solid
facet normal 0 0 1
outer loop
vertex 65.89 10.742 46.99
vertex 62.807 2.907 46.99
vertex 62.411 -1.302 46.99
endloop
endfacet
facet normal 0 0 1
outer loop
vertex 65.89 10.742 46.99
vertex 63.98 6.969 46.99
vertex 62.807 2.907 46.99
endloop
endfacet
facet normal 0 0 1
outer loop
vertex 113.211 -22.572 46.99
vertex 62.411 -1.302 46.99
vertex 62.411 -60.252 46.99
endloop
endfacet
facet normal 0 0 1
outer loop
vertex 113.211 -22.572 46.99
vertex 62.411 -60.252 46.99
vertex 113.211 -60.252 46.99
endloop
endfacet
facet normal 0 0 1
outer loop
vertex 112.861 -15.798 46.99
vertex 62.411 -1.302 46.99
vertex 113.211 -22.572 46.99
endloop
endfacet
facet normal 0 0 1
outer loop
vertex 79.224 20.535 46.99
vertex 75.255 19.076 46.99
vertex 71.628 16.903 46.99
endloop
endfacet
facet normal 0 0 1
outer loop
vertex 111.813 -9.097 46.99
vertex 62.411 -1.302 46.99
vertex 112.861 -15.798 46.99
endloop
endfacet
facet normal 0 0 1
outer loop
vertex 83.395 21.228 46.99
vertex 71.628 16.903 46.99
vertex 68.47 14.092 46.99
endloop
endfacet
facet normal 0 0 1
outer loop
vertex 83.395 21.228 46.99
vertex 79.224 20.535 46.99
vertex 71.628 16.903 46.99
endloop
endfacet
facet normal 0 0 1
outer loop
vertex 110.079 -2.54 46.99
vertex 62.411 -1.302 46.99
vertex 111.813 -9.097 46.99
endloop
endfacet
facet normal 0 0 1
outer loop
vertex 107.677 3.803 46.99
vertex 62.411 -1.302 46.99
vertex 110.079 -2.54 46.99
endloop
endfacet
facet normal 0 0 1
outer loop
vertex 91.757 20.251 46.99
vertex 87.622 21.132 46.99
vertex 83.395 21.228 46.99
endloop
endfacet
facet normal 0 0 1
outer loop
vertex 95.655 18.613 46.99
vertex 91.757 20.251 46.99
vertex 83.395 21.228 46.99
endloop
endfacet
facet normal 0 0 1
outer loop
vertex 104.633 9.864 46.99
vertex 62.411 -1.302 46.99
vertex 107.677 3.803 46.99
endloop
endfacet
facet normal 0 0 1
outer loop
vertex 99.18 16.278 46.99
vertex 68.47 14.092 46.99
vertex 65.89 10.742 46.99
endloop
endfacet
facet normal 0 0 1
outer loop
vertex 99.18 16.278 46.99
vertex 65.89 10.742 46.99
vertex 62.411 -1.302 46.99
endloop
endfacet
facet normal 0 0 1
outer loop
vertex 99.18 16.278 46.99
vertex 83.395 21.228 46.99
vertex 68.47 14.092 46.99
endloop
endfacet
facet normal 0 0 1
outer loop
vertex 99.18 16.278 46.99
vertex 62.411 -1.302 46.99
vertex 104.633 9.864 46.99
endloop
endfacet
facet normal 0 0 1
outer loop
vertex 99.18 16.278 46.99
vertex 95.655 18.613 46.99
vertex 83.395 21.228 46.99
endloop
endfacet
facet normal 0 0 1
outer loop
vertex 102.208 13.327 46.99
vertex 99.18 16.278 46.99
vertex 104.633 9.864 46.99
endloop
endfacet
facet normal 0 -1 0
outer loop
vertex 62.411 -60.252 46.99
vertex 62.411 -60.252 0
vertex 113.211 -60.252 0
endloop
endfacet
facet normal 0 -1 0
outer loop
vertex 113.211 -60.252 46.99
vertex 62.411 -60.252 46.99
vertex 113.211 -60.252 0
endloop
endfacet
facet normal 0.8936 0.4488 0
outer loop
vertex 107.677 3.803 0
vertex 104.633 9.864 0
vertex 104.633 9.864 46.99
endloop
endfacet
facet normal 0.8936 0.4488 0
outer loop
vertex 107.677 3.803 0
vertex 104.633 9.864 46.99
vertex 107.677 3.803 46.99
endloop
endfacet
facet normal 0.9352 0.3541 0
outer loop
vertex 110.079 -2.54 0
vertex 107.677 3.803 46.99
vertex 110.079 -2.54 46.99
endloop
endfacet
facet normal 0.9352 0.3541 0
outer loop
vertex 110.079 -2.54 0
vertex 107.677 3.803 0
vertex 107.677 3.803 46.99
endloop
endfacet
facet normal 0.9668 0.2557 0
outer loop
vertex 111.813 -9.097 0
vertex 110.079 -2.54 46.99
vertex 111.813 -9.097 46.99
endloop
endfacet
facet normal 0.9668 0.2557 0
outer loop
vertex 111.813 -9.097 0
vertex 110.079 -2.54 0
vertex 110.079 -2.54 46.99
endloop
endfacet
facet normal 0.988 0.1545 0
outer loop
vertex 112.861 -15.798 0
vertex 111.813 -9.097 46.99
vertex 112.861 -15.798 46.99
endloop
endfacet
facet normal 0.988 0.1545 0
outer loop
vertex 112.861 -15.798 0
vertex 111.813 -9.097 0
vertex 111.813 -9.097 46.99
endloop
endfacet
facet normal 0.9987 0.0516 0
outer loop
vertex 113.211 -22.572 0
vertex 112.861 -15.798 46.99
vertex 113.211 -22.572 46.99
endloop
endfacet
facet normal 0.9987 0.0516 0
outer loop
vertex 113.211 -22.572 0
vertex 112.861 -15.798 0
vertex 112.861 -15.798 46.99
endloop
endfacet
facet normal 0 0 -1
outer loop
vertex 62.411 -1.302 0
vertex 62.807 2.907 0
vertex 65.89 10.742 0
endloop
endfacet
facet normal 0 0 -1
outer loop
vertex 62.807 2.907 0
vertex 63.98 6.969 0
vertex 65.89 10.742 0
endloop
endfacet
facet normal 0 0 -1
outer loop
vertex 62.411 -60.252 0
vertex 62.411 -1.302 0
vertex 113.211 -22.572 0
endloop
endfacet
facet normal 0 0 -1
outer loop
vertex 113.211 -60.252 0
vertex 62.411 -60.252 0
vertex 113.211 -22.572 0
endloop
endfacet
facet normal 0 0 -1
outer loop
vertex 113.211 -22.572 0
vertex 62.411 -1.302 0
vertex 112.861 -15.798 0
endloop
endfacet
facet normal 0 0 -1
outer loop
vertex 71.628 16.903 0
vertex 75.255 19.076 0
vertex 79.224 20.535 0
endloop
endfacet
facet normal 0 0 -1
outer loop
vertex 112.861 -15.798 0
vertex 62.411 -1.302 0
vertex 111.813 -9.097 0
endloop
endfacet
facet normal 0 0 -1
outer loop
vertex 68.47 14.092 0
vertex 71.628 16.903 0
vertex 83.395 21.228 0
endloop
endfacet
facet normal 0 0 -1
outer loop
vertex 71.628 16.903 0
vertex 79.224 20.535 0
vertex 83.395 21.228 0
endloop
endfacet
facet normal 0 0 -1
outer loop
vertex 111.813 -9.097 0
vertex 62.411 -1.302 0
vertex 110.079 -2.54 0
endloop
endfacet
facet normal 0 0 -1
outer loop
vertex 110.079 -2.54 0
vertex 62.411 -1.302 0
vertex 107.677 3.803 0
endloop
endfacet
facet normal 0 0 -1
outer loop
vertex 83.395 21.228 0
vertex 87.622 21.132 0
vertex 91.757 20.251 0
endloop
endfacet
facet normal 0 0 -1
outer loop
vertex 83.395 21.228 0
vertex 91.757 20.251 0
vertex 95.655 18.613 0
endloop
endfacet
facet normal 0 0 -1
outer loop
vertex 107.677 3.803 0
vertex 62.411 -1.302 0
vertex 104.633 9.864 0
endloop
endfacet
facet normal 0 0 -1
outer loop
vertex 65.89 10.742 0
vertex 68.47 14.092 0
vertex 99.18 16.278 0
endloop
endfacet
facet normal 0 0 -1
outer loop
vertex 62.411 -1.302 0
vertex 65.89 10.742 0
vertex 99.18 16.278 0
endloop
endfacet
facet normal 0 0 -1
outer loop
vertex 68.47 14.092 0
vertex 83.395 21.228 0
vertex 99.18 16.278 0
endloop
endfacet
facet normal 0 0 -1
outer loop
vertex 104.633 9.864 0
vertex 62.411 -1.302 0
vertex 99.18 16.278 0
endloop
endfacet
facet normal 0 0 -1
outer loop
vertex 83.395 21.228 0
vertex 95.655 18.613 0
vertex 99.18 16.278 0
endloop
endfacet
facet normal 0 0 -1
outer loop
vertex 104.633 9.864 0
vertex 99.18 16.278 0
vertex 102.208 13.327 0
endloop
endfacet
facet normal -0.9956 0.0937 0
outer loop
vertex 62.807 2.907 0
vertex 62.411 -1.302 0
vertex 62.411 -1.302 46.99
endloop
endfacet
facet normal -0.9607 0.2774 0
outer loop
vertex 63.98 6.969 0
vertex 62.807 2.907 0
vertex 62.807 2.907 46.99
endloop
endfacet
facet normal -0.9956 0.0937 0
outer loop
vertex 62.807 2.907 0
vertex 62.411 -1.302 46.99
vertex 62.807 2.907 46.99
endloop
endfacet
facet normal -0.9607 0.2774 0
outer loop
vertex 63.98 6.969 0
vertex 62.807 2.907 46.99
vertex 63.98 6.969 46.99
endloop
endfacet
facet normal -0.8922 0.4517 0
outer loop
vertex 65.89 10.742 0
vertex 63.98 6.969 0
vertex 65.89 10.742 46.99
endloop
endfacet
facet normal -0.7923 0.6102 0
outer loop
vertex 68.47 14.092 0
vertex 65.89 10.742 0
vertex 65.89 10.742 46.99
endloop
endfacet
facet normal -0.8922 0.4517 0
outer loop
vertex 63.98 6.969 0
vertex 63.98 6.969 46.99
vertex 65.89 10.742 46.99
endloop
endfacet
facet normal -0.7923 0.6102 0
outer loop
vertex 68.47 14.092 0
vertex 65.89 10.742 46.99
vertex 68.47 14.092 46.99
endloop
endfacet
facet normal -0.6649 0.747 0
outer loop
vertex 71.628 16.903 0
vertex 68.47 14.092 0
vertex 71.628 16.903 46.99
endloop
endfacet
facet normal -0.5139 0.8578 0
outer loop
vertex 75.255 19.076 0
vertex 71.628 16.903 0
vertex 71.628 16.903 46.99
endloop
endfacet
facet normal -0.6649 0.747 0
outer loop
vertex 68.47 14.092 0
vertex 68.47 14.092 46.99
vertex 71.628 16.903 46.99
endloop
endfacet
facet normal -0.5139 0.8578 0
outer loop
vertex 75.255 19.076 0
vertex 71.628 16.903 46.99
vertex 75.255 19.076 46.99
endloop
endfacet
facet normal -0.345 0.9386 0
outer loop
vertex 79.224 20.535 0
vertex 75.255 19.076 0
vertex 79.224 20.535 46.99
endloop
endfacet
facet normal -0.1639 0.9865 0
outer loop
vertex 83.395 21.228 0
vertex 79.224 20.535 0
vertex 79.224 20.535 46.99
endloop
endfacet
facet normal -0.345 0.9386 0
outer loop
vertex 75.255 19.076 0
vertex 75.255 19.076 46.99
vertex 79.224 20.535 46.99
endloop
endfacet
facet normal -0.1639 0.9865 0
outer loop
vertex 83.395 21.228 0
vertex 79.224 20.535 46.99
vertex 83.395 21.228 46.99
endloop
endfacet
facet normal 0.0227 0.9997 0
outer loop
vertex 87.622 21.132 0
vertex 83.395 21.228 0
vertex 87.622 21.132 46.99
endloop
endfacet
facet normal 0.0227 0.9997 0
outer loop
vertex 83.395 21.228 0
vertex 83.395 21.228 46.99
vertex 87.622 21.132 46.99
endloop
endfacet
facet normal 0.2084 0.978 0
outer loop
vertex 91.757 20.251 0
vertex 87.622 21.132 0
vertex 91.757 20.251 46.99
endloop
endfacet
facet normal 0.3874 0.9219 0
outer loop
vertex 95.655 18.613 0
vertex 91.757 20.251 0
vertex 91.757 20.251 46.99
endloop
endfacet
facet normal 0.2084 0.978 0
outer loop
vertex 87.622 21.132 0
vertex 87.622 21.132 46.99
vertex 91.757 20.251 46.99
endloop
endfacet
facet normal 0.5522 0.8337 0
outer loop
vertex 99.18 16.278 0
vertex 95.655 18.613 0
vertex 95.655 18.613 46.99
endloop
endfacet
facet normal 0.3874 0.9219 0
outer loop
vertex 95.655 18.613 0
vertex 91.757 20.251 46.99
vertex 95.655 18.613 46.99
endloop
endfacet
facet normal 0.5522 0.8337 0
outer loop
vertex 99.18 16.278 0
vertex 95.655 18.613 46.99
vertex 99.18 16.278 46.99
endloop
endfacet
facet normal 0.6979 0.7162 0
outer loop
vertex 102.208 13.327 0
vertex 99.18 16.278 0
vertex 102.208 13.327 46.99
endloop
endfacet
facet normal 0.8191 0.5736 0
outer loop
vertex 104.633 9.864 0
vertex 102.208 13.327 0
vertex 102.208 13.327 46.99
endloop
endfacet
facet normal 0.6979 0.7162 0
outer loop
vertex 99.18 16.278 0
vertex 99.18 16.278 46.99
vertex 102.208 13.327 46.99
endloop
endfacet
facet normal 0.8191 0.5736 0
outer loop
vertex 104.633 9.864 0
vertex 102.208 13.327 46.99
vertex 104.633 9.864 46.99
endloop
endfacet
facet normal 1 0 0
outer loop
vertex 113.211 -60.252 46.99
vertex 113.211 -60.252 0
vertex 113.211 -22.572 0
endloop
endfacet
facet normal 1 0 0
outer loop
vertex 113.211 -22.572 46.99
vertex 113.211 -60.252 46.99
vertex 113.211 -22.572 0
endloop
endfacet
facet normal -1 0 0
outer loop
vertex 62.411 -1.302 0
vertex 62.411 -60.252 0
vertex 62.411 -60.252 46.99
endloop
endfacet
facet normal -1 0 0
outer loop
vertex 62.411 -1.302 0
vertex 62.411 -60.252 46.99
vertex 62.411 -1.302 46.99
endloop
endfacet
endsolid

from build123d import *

# Parameters (mm, degrees)
F0_W        = 50.8
F0_H        = 101.6
F1_DEPTH    = 46.99
F2_T1_DEPTH = 366.5870593472
F3_R        = 22.587582604


# Not quite as in the source:
# - a fillet or chamfer that OpenCascade refuses, or shapes differently, is made with other operations: its cross-section is extruded or revolved along the edge and cut away or added


with BuildPart() as f1:
    # F0 (on Top) → F1 (new body)
    with BuildSketch(Plane.XY):
        with Locations((87.8112020218, -9.4523200796)):
            Rectangle(F0_W, F0_H)
    extrude(amount=F1_DEPTH)

    # F2: fillet of radius 65.6134961982 on 1 edges, made by hand

    # F2_s2 → F2_t1 (cut)
    with BuildSketch(Plane.XY.offset(-159.7985296736)):
        with BuildLine():
            ThreePointArc((62.4112020218, 41.3476799204), (98.964505217, 18.2520699738), (113.2112020218, -22.571731949))
            Line((113.2112020218, -22.571731949), (113.2112020218, 41.3476799204))
            Line((113.2112020218, 41.3476799204), (62.4112020218, 41.3476799204))
        make_face()
    extrude(amount=F2_T1_DEPTH, mode=Mode.SUBTRACT)

    # F3
    f3_edges = [f1.edges().sort_by_distance(p)[0] for p in [
        (62.411202, 41.34768, 23.495),
    ]]
    fillet(f3_edges, radius=F3_R)


solid = f1.part
